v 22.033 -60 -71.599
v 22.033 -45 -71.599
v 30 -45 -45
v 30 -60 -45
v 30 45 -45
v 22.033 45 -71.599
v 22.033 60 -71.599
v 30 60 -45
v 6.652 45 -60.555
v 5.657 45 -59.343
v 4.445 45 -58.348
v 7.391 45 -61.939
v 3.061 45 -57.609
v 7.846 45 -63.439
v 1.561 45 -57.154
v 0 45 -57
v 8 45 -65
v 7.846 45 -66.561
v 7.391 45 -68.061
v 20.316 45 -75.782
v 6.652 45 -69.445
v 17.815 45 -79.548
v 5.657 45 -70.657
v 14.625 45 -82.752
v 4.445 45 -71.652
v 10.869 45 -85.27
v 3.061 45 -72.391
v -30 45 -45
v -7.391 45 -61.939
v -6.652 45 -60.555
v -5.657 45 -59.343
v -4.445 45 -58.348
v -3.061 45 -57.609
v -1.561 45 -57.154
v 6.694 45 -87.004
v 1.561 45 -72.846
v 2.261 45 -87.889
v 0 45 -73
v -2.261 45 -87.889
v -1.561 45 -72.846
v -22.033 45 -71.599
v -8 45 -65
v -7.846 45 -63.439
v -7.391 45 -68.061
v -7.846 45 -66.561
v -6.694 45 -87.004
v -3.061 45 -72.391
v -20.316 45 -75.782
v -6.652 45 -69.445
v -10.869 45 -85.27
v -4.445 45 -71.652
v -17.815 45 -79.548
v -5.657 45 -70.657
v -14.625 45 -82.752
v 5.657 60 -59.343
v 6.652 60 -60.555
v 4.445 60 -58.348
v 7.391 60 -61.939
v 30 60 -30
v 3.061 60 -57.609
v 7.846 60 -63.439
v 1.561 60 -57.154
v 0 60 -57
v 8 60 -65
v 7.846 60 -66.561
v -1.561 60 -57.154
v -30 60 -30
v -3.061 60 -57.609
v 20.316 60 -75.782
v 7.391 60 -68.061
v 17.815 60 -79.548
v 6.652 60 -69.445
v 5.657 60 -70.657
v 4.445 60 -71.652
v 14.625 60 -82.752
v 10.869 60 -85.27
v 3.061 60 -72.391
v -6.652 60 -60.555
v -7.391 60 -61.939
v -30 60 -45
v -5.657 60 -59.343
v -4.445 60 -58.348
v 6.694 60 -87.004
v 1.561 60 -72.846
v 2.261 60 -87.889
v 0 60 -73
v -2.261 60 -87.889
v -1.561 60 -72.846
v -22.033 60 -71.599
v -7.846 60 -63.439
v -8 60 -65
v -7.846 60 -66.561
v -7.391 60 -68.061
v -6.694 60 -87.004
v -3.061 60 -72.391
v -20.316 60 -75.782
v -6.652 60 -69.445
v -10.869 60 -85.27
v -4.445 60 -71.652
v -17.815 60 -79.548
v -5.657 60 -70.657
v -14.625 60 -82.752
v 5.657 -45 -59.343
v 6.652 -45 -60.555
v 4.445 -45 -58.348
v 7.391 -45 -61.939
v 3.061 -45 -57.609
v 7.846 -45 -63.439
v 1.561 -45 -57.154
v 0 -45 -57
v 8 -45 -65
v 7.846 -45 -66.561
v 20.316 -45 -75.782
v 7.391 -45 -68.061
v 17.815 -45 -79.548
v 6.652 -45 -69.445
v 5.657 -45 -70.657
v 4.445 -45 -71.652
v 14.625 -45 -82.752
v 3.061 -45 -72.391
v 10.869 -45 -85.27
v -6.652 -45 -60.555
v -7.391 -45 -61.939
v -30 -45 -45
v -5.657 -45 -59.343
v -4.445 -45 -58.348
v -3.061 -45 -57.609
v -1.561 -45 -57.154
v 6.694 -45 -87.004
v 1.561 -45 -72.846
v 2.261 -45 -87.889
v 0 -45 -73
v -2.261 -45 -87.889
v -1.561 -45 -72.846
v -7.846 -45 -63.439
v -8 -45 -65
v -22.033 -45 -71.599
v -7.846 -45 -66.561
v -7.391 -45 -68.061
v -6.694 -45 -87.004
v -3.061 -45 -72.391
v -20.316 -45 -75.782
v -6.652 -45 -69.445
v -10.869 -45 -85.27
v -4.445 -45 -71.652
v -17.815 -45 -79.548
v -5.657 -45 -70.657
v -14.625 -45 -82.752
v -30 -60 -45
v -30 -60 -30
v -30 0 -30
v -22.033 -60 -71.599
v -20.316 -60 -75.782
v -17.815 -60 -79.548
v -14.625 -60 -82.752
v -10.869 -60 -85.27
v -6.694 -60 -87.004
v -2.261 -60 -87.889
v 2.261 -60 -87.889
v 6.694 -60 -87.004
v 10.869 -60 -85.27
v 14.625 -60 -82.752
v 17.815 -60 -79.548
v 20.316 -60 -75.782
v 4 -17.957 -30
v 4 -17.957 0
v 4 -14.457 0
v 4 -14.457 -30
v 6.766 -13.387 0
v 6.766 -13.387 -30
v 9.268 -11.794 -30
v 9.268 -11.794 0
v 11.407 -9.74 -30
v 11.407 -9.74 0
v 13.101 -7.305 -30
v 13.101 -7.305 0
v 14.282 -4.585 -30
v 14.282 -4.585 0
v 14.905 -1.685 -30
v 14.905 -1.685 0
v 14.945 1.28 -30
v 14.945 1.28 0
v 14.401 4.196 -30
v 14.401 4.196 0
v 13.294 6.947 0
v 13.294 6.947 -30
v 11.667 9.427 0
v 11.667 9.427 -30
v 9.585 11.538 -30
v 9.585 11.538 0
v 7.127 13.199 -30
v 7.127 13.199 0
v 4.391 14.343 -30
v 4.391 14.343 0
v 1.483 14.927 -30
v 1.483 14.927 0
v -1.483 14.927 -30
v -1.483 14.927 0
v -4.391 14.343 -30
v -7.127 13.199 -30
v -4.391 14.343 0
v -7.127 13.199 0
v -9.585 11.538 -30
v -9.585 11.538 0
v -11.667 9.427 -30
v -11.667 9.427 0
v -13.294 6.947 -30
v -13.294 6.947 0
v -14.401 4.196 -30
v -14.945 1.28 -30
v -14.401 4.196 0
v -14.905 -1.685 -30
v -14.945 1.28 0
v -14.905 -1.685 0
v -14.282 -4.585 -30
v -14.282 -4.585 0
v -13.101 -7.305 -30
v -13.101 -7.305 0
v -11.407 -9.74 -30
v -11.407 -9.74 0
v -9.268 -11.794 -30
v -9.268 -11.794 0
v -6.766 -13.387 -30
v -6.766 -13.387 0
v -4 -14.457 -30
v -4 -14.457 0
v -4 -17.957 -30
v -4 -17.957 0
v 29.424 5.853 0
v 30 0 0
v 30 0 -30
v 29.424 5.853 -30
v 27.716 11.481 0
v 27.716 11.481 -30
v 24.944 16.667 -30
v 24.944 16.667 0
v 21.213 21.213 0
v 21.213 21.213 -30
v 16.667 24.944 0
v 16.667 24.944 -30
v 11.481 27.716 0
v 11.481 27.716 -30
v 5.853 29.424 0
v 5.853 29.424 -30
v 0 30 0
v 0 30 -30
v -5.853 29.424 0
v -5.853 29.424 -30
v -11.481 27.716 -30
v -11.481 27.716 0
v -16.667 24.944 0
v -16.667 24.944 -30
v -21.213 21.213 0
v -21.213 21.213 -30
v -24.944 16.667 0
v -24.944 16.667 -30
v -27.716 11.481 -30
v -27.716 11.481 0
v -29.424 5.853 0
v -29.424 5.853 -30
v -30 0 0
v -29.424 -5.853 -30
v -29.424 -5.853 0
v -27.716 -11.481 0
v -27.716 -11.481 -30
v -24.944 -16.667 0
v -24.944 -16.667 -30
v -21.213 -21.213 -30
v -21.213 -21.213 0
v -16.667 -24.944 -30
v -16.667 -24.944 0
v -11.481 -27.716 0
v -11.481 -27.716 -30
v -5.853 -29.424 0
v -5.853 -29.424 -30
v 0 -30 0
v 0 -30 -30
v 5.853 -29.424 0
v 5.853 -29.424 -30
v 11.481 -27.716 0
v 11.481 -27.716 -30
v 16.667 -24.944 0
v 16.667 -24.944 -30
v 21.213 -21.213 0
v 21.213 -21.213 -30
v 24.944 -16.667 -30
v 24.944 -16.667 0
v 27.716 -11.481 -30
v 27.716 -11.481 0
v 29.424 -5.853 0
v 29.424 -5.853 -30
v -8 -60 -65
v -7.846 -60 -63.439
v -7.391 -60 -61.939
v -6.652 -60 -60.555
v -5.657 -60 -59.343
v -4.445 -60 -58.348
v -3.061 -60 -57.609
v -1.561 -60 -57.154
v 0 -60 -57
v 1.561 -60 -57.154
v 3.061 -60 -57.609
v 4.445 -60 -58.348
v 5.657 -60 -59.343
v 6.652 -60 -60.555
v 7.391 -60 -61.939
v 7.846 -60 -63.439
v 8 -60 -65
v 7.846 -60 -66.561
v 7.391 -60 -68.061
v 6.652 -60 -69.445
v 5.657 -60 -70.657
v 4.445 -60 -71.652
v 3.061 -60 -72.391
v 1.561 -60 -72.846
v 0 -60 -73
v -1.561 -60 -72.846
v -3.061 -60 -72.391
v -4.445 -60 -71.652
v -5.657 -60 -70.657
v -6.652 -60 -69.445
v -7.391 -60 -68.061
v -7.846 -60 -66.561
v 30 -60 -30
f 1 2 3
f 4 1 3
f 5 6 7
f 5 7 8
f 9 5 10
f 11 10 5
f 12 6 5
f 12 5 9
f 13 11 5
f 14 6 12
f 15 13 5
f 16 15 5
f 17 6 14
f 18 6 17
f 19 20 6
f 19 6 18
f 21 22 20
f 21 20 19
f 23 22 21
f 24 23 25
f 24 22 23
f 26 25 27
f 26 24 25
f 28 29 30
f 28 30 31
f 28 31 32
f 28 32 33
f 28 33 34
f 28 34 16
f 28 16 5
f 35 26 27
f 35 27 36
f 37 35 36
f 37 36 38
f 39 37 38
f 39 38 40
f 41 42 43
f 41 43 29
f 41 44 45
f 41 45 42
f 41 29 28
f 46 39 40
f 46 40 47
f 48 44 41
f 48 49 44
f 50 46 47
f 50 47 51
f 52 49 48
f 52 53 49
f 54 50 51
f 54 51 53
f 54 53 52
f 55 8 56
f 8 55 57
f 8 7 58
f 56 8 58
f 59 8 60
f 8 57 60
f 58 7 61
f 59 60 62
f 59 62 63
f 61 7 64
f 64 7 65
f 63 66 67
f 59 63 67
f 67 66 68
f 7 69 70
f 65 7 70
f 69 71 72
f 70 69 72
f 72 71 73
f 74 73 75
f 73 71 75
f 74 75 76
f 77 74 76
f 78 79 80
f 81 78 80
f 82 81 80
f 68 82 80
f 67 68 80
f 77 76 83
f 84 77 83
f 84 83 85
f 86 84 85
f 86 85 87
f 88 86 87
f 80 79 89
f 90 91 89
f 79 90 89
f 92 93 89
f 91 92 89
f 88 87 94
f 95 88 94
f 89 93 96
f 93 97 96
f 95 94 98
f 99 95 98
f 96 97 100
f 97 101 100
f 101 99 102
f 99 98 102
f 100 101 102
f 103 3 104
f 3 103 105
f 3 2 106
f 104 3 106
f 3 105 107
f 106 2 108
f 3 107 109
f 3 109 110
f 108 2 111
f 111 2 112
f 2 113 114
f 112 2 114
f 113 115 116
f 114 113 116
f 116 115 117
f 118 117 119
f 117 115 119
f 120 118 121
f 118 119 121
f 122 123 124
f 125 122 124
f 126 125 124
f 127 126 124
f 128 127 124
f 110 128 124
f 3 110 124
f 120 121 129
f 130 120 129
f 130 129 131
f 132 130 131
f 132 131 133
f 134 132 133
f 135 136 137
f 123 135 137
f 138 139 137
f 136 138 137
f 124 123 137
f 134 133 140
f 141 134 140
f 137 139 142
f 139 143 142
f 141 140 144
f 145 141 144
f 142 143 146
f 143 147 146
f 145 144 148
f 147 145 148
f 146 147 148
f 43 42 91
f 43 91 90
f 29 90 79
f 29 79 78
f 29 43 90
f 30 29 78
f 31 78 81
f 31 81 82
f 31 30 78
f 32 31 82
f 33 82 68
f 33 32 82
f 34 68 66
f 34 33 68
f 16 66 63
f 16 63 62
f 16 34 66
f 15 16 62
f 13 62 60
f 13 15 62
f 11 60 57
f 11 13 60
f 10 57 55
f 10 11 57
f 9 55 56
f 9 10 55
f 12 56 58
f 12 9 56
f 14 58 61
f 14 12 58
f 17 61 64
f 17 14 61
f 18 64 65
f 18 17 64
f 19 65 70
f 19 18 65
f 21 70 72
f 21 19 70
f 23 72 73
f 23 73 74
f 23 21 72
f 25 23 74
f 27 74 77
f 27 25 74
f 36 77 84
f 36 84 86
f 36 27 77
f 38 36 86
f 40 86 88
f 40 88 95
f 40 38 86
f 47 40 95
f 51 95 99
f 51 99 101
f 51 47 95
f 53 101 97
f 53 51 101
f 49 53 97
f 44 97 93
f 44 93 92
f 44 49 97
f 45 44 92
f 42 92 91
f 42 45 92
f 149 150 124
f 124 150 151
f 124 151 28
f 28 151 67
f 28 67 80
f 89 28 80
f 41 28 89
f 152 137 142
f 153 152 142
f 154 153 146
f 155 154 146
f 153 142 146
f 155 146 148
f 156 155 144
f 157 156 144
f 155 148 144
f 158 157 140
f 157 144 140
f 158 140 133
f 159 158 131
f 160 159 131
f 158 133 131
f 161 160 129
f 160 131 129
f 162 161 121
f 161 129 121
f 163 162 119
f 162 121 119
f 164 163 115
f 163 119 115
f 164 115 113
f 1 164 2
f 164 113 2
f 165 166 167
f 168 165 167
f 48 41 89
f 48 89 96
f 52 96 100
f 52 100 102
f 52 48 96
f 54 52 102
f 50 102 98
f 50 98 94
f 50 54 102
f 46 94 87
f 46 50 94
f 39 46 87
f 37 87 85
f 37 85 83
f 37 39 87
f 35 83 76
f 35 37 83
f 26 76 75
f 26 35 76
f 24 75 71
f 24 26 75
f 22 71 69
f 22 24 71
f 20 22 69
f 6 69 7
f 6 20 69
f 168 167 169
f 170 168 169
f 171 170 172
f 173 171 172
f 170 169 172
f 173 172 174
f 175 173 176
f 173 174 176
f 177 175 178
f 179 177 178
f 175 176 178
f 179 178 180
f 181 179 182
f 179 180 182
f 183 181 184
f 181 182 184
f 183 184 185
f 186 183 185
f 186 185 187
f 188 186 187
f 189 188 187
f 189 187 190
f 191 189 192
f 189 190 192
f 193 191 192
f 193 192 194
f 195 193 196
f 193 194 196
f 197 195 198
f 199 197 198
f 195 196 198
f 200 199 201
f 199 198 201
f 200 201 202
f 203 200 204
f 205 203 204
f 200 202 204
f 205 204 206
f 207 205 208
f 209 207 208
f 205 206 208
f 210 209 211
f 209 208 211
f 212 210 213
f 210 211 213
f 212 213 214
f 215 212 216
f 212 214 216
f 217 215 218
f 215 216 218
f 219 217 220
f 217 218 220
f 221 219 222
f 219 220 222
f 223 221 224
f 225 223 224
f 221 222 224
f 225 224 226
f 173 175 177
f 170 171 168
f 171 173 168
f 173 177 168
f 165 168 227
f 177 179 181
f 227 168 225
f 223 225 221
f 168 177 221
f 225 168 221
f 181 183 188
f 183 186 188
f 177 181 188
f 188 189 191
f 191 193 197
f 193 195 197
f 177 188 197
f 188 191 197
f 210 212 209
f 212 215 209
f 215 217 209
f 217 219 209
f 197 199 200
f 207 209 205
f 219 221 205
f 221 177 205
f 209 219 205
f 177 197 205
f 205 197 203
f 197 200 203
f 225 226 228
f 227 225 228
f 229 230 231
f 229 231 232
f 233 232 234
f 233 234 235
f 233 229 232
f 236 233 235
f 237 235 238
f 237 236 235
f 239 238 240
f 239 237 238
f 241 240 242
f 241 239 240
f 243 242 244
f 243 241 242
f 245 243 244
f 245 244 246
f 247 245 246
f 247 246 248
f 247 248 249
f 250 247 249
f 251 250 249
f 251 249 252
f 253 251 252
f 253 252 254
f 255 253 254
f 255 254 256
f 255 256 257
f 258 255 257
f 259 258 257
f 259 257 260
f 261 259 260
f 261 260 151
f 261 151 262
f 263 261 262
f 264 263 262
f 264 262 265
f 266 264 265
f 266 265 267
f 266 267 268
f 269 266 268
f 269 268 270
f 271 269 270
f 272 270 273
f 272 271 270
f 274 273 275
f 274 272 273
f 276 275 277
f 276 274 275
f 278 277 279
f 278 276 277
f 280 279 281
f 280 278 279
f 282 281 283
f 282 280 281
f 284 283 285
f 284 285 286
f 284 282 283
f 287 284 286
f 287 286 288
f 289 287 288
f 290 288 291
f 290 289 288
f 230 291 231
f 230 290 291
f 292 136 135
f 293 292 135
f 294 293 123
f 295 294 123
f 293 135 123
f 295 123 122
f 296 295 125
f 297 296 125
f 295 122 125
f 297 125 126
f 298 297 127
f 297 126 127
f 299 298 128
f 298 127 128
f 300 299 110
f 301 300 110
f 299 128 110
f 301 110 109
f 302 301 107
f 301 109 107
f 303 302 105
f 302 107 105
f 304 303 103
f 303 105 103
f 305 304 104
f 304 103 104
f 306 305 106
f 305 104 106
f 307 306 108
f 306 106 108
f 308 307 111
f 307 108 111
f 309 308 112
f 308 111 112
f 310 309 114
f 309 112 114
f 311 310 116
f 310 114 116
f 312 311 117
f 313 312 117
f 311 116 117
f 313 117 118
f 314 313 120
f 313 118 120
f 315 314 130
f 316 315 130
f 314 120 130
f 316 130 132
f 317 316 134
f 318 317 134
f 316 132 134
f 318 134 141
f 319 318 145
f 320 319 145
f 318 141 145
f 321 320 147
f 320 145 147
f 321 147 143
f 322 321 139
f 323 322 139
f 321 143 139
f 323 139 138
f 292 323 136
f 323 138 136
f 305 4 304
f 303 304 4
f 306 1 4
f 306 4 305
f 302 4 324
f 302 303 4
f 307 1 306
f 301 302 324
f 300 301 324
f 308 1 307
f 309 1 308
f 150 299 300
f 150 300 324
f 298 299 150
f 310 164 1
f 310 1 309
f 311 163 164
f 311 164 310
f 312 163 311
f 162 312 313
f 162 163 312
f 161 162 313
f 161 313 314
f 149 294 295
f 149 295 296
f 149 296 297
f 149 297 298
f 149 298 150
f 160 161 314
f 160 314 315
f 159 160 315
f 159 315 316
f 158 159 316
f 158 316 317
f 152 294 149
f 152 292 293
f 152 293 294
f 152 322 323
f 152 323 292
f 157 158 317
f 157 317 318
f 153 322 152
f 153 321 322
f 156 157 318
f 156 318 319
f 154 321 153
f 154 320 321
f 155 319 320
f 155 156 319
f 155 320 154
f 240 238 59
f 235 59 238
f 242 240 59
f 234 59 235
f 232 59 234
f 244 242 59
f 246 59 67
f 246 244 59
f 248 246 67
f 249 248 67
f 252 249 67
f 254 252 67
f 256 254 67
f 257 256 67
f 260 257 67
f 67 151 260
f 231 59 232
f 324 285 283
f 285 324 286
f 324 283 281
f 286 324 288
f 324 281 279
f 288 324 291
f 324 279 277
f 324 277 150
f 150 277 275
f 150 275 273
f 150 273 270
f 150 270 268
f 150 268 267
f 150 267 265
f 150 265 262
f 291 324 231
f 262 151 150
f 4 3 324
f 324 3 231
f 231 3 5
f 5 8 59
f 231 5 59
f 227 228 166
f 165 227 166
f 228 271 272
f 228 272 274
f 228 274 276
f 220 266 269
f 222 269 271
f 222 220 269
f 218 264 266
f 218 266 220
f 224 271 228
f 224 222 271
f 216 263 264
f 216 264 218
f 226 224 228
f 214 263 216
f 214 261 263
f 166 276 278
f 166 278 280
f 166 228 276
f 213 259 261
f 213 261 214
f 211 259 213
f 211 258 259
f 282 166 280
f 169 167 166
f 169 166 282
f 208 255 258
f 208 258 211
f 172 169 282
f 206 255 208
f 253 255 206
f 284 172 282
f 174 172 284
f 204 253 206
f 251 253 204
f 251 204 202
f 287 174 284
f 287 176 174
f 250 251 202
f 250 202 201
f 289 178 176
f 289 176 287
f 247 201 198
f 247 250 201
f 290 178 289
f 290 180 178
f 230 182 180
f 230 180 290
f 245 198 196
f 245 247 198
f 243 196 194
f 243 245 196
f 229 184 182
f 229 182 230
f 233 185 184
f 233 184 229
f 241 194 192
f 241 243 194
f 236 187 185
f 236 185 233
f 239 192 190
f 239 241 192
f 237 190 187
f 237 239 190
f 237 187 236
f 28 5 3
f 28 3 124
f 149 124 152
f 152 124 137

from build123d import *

# Parameters (mm, degrees)
SKETCH1_R           = 30
BOSS_EXTRUDE1_DEPTH = 30
SKETCH2_W           = 60
SKETCH2_H           = 90
BOSS_EXTRUDE2_DEPTH = 15
SKETCH3_R           = 8
BOSS_EXTRUDE3_DEPTH = 15


with BuildPart() as part:
    # Sketch1 → Boss-Extrude1 (new body)
    with BuildSketch(Plane.XY):
        Circle(SKETCH1_R)
        with BuildLine():
            Line((-4, -14.456832295), (-4, -17.956832295))
            Line((-4, -17.956832295), (4, -17.956832295))
            Line((4, -17.956832295), (4, -14.456832295))
            ThreePointArc((4, -14.456832295), (0, 15), (-4, -14.456832295))
        make_face(mode=Mode.SUBTRACT)
    extrude(amount=-BOSS_EXTRUDE1_DEPTH)

    # Sketch2 → Boss-Extrude2 (add)
    with BuildSketch(Plane(origin=(0, 0, -30), x_dir=(-1, 0, 0), z_dir=(0, 0, -1))):
        Rectangle(SKETCH2_W, SKETCH2_H)
    extrude(amount=BOSS_EXTRUDE2_DEPTH)

    # Sketch3 → Boss-Extrude3 (add)
    with BuildSketch(Plane(origin=(0, 45, 0), x_dir=(1, 0, 0), z_dir=(0, 1, 0))):
        with BuildLine():
            Line((-30, 45), (-22.03289839, 71.599347585))
            ThreePointArc((-22.03289839, 71.599347585), (0, 88), (22.03289839, 71.599347585))
            Line((22.03289839, 71.599347585), (30, 45))
            Line((30, 45), (30, 30))
            Line((30, 30), (-30, 30))
            Line((-30, 30), (-30, 45))
        make_face()
        with Locations(Location((0, 65, 0), (0, 0, 180))):
            Circle(SKETCH3_R, mode=Mode.SUBTRACT)
    boss_extrude3 = extrude(amount=BOSS_EXTRUDE3_DEPTH)

    # Mirror1: Boss-Extrude3 across plane
    add(boss_extrude3.mirror(Plane.ZX))


solid = part.part
